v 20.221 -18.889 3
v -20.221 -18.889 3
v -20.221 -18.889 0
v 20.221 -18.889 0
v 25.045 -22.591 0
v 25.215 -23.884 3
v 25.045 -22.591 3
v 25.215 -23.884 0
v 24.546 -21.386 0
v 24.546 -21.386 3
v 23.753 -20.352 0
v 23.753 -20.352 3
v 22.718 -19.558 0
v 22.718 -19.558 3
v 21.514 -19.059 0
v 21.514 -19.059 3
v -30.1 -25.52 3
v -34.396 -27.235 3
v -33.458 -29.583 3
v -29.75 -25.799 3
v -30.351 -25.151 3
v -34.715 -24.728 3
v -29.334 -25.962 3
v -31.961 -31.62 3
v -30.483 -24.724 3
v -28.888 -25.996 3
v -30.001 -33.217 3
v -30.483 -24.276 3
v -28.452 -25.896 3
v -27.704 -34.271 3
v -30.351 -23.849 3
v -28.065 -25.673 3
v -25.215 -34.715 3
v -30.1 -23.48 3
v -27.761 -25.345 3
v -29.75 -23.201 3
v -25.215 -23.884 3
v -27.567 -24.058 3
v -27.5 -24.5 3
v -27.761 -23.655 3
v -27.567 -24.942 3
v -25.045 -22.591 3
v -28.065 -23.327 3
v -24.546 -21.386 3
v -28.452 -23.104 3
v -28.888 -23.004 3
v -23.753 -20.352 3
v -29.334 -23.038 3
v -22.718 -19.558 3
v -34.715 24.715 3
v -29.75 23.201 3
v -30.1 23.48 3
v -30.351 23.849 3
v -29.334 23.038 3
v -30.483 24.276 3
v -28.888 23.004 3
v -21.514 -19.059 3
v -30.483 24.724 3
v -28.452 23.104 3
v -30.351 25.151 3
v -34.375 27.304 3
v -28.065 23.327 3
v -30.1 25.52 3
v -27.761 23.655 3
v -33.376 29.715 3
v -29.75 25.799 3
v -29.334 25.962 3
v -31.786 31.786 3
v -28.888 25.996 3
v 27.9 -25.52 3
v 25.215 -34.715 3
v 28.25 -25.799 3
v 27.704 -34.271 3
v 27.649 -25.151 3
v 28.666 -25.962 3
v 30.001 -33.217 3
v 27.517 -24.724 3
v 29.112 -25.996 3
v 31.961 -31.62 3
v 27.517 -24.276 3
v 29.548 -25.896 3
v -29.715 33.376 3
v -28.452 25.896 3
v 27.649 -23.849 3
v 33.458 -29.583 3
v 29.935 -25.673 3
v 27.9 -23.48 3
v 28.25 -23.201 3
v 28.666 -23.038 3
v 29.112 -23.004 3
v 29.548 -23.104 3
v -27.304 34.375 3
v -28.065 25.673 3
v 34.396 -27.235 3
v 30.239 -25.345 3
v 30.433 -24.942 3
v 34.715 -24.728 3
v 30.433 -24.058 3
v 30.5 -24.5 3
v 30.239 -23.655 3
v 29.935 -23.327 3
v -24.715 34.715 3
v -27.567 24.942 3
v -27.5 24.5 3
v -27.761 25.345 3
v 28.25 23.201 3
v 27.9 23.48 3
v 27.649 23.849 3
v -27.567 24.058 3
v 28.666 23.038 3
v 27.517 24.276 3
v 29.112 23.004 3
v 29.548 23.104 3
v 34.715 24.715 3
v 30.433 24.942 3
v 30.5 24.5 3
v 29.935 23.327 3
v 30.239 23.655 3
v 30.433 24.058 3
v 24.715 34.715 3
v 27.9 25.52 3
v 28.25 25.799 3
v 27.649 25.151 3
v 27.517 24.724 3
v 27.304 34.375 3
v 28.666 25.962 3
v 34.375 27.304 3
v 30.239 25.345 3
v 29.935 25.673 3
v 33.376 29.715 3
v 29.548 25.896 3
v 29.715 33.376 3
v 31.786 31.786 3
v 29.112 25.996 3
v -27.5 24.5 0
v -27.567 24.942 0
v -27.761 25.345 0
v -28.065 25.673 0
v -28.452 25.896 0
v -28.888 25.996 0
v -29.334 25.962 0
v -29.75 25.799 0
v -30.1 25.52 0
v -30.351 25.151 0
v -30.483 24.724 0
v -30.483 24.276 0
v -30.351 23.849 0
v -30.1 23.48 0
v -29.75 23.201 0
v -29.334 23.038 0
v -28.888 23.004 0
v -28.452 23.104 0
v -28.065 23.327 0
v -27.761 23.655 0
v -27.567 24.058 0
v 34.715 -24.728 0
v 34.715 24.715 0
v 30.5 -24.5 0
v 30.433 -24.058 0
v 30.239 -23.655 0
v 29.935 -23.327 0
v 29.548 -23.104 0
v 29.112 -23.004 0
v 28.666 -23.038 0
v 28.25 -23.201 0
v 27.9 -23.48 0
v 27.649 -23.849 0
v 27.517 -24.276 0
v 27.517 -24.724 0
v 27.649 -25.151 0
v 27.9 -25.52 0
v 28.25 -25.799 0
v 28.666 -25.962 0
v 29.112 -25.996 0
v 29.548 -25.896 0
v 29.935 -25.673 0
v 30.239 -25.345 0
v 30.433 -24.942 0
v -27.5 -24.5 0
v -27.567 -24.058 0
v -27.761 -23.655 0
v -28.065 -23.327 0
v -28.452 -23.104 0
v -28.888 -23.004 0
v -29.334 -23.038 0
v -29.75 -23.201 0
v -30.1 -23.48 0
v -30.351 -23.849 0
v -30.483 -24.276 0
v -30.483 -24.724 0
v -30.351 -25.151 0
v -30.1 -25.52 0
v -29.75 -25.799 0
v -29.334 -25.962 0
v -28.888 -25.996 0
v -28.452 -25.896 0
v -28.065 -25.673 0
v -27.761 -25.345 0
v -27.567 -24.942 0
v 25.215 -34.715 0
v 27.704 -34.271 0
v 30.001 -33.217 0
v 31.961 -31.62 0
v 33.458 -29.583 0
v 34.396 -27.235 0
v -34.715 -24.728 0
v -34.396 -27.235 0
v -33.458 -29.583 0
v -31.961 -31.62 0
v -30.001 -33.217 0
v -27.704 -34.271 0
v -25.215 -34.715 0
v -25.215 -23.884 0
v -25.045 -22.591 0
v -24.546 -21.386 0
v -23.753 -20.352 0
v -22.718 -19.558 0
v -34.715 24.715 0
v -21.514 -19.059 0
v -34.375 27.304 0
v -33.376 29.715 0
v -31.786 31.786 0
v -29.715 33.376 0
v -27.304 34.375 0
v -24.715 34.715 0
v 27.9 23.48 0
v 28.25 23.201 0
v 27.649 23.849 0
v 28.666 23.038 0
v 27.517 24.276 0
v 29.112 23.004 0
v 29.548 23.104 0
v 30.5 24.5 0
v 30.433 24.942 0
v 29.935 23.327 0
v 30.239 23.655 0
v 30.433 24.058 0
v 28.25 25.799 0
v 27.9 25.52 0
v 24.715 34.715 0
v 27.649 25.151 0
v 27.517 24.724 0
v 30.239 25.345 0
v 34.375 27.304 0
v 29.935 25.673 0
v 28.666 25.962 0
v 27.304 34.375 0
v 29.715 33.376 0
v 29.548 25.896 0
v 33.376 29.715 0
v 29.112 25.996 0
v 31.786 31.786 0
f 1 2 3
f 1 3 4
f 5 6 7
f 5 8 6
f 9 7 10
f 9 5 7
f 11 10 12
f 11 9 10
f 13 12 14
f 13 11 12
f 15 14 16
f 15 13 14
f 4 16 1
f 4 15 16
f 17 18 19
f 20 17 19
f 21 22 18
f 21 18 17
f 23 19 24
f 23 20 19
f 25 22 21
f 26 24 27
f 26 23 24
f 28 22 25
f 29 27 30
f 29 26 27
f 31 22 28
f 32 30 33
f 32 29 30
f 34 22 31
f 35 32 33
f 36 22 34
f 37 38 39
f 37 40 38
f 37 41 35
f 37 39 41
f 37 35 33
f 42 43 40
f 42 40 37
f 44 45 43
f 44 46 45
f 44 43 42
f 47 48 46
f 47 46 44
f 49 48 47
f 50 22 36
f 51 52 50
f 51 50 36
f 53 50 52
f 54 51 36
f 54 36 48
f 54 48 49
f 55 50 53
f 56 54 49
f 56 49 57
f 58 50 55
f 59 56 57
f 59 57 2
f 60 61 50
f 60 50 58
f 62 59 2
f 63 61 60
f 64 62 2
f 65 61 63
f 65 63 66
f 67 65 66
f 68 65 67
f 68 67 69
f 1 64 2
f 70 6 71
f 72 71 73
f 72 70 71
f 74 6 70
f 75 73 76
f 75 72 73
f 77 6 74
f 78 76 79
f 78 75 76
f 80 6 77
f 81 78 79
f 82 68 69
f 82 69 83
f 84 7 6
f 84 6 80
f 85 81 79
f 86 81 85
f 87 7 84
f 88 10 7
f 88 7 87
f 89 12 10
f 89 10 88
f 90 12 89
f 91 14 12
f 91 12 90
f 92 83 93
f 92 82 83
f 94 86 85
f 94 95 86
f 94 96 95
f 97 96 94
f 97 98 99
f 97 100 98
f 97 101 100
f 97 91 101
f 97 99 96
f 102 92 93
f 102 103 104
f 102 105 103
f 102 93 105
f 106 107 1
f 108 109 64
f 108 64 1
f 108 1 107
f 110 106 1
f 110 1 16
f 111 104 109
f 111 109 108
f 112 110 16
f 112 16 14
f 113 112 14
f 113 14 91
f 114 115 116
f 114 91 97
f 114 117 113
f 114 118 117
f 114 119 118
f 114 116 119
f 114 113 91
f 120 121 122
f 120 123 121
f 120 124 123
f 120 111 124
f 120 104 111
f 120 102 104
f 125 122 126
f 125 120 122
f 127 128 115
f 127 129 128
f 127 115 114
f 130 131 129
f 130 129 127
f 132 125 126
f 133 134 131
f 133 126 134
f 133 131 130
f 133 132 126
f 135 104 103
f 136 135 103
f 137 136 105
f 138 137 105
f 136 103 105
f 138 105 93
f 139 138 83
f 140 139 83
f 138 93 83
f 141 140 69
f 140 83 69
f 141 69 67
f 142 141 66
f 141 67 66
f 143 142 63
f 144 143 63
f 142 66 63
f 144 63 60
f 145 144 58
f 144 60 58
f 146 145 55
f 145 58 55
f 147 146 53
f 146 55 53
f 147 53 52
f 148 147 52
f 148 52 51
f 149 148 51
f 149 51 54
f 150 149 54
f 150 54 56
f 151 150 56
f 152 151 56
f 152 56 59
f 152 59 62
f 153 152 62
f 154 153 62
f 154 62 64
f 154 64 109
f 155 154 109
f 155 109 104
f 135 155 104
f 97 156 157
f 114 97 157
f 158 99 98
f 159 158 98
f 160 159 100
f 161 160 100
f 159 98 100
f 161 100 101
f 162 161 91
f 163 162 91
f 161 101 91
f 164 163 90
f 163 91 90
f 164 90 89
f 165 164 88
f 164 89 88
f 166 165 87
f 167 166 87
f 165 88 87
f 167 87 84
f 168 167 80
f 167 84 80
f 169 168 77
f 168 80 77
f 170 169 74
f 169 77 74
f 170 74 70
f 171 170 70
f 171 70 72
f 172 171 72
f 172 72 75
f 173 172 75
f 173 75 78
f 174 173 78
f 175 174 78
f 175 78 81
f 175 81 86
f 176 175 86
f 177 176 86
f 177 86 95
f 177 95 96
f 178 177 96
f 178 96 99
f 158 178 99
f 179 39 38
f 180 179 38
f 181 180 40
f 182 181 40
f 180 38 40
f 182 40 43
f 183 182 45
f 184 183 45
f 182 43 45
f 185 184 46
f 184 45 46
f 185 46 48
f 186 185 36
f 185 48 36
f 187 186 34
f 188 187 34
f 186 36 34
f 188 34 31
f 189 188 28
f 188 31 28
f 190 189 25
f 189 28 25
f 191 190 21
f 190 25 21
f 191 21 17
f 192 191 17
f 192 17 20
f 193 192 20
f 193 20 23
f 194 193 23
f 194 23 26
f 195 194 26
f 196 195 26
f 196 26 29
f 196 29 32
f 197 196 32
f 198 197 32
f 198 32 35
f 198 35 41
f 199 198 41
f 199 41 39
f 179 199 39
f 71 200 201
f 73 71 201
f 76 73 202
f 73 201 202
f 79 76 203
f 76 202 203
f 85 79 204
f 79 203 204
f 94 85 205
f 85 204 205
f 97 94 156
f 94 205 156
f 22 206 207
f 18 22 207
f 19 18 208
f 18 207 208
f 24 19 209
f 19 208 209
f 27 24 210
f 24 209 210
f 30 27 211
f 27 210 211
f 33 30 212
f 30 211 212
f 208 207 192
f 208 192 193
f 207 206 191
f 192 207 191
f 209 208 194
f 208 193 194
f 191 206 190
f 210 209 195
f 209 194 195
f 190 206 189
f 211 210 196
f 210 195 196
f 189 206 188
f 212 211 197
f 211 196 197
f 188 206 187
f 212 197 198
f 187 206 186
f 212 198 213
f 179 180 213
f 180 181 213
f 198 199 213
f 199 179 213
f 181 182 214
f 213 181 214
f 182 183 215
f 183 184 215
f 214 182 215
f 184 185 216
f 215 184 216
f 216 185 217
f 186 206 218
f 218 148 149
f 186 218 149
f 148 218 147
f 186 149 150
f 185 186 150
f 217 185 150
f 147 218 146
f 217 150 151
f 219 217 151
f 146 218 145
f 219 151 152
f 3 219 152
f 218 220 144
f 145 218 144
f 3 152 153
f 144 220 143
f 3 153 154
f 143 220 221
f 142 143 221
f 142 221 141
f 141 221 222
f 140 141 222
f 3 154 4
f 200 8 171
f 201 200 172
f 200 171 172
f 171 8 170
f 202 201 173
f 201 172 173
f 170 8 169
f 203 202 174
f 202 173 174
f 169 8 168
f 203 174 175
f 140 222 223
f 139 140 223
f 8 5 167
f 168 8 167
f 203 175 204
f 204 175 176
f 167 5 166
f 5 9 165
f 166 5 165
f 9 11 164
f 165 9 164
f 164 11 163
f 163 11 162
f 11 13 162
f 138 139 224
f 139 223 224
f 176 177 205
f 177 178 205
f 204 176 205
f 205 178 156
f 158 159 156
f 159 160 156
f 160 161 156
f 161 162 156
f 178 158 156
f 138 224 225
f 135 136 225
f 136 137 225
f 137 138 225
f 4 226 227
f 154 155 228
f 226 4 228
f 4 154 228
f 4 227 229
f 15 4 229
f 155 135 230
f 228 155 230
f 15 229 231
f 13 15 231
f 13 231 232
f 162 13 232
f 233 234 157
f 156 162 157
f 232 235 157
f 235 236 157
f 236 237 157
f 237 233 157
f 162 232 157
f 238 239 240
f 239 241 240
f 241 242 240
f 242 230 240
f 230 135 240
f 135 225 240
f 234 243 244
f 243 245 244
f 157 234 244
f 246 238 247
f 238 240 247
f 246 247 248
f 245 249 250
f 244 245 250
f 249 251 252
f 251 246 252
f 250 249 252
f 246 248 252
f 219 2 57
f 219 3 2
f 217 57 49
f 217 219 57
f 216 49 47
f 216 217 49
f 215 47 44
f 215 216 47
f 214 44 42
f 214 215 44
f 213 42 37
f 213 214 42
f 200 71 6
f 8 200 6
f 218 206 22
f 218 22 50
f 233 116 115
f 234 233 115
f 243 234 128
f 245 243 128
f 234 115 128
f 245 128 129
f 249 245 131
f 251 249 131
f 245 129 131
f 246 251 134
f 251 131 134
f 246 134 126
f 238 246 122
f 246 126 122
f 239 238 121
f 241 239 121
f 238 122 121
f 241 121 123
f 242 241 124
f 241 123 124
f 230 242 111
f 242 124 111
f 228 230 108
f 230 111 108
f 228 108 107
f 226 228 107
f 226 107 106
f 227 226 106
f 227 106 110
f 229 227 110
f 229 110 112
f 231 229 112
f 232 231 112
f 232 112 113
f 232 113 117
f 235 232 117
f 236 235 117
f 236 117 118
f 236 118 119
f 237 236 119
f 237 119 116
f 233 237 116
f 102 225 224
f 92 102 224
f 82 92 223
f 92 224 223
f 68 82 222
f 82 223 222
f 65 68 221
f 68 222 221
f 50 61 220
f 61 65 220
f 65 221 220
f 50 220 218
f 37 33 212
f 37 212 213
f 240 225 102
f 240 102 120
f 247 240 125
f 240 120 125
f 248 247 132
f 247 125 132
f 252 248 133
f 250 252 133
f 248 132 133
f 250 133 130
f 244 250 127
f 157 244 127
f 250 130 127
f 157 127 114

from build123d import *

# Parameters (mm, degrees)
SKETCH1_W           = 69.43077851
SKETCH1_H           = 69.43077851
BOSS_EXTRUDE2_DEPTH = 3
SKETCH6_R           = 1.5
SKETCH6_W           = 50.43077851
SKETCH6_H           = 15.826208999
CUT_EXTRUDE1_DEPTH  = 10
FILLET1_R           = 10
FILLET2_R           = 10
FILLET3_R           = 4.994579941


with BuildPart() as part:
    # Sketch1 → Boss-Extrude2 (new body)
    with BuildSketch(Plane.XY):
        Rectangle(SKETCH1_W, SKETCH1_H)
    extrude(amount=BOSS_EXTRUDE2_DEPTH)

    # Sketch6 → Cut-Extrude1 (cut)
    with BuildSketch(Plane.XY.offset(3)):
        with Locations((-29, 24.5)):
            Circle(SKETCH6_R)
        with Locations((-29, -24.5)):
            Circle(SKETCH6_R)
        with Locations((29, -24.5)):
            Circle(SKETCH6_R)
        with Locations((29, 24.5)):
            Circle(SKETCH6_R)
        with Locations((0, -26.802284756)):
            Rectangle(SKETCH6_W, SKETCH6_H)
    extrude(amount=-CUT_EXTRUDE1_DEPTH, mode=Mode.SUBTRACT)

    # Fillet1
    fillet1_edges = [part.edges().sort_by_distance(p)[0] for p in [
        (34.715389255, 34.715389255, 1.5),
    ]]
    fillet(fillet1_edges, radius=FILLET1_R)

    # Fillet2
    # the kernel refuses this fillet: 10 mm, written as the material it takes off along each edge
    with BuildSketch(Plane(origin=(34.715389255, -34.715389255, -24.968730444), x_dir=(0, 1, 0), z_dir=(0, 0, 1))) as fillet2_piece_1:
        with BuildLine():
            CenterArc((9.987492178, 10), FILLET2_R, 182.865983983, 87.134016017)
            Line((0, 9.5), (-0.199749844, 9.49))
            ThreePointArc((-0.199749844, 9.49), (-0.2, 4.75), (-0.2, 0))
            Line((-0.2, 0), (0, -0.2))
            Line((0, -0.2), (9.987492178, -0.2))
            Line((9.987492178, -0.2), (9.987492178, 0))
        make_face()
    extrude(amount=52.937460889, mode=Mode.SUBTRACT)
    with BuildSketch(Plane(origin=(-34.715389255, -34.715389255, -24.968730444), x_dir=(0, 1, 0), z_dir=(0, 0, 1))) as fillet2_piece_2:
        with BuildLine():
            CenterArc((9.987492178, -10), FILLET2_R, 90, 87.134016017)
            Line((0, -9.5), (-0.199749844, -9.49))
            ThreePointArc((-0.199749844, -9.49), (-0.2, -4.75), (-0.2, 0))
            Line((-0.2, 0), (0, 0.2))
            Line((0, 0.2), (9.987492178, 0.2))
            Line((9.987492178, 0.2), (9.987492178, 0))
        make_face()
    extrude(amount=52.937460889, mode=Mode.SUBTRACT)
    with BuildSketch(Plane(origin=(-34.715389255, 34.715389255, -25), x_dir=(1, 0, 0), z_dir=(0, 0, 1))) as fillet2_piece_3:
        with BuildLine():
            CenterArc((FILLET2_R, -FILLET2_R), FILLET2_R, 90, 90)
            Line((0, -FILLET2_R), (-FILLET2_R * 0.02, -FILLET2_R))
            Line((-FILLET2_R * 0.02, -FILLET2_R), (-FILLET2_R * 0.02, FILLET2_R * 0.02))
            Line((-FILLET2_R * 0.02, FILLET2_R * 0.02), (FILLET2_R, FILLET2_R * 0.02))
            Line((FILLET2_R, FILLET2_R * 0.02), (FILLET2_R, 0))
        make_face()
    extrude(amount=53, mode=Mode.SUBTRACT)

    # Fillet3
    fillet3_edges = [part.edges().sort_by_distance(p)[0] for p in [
        (-25.215389255, -18.889180256, 1.5),
        (25.215389255, -18.889180256, 1.5),
    ]]
    fillet(fillet3_edges, radius=FILLET3_R)


solid = part.part
